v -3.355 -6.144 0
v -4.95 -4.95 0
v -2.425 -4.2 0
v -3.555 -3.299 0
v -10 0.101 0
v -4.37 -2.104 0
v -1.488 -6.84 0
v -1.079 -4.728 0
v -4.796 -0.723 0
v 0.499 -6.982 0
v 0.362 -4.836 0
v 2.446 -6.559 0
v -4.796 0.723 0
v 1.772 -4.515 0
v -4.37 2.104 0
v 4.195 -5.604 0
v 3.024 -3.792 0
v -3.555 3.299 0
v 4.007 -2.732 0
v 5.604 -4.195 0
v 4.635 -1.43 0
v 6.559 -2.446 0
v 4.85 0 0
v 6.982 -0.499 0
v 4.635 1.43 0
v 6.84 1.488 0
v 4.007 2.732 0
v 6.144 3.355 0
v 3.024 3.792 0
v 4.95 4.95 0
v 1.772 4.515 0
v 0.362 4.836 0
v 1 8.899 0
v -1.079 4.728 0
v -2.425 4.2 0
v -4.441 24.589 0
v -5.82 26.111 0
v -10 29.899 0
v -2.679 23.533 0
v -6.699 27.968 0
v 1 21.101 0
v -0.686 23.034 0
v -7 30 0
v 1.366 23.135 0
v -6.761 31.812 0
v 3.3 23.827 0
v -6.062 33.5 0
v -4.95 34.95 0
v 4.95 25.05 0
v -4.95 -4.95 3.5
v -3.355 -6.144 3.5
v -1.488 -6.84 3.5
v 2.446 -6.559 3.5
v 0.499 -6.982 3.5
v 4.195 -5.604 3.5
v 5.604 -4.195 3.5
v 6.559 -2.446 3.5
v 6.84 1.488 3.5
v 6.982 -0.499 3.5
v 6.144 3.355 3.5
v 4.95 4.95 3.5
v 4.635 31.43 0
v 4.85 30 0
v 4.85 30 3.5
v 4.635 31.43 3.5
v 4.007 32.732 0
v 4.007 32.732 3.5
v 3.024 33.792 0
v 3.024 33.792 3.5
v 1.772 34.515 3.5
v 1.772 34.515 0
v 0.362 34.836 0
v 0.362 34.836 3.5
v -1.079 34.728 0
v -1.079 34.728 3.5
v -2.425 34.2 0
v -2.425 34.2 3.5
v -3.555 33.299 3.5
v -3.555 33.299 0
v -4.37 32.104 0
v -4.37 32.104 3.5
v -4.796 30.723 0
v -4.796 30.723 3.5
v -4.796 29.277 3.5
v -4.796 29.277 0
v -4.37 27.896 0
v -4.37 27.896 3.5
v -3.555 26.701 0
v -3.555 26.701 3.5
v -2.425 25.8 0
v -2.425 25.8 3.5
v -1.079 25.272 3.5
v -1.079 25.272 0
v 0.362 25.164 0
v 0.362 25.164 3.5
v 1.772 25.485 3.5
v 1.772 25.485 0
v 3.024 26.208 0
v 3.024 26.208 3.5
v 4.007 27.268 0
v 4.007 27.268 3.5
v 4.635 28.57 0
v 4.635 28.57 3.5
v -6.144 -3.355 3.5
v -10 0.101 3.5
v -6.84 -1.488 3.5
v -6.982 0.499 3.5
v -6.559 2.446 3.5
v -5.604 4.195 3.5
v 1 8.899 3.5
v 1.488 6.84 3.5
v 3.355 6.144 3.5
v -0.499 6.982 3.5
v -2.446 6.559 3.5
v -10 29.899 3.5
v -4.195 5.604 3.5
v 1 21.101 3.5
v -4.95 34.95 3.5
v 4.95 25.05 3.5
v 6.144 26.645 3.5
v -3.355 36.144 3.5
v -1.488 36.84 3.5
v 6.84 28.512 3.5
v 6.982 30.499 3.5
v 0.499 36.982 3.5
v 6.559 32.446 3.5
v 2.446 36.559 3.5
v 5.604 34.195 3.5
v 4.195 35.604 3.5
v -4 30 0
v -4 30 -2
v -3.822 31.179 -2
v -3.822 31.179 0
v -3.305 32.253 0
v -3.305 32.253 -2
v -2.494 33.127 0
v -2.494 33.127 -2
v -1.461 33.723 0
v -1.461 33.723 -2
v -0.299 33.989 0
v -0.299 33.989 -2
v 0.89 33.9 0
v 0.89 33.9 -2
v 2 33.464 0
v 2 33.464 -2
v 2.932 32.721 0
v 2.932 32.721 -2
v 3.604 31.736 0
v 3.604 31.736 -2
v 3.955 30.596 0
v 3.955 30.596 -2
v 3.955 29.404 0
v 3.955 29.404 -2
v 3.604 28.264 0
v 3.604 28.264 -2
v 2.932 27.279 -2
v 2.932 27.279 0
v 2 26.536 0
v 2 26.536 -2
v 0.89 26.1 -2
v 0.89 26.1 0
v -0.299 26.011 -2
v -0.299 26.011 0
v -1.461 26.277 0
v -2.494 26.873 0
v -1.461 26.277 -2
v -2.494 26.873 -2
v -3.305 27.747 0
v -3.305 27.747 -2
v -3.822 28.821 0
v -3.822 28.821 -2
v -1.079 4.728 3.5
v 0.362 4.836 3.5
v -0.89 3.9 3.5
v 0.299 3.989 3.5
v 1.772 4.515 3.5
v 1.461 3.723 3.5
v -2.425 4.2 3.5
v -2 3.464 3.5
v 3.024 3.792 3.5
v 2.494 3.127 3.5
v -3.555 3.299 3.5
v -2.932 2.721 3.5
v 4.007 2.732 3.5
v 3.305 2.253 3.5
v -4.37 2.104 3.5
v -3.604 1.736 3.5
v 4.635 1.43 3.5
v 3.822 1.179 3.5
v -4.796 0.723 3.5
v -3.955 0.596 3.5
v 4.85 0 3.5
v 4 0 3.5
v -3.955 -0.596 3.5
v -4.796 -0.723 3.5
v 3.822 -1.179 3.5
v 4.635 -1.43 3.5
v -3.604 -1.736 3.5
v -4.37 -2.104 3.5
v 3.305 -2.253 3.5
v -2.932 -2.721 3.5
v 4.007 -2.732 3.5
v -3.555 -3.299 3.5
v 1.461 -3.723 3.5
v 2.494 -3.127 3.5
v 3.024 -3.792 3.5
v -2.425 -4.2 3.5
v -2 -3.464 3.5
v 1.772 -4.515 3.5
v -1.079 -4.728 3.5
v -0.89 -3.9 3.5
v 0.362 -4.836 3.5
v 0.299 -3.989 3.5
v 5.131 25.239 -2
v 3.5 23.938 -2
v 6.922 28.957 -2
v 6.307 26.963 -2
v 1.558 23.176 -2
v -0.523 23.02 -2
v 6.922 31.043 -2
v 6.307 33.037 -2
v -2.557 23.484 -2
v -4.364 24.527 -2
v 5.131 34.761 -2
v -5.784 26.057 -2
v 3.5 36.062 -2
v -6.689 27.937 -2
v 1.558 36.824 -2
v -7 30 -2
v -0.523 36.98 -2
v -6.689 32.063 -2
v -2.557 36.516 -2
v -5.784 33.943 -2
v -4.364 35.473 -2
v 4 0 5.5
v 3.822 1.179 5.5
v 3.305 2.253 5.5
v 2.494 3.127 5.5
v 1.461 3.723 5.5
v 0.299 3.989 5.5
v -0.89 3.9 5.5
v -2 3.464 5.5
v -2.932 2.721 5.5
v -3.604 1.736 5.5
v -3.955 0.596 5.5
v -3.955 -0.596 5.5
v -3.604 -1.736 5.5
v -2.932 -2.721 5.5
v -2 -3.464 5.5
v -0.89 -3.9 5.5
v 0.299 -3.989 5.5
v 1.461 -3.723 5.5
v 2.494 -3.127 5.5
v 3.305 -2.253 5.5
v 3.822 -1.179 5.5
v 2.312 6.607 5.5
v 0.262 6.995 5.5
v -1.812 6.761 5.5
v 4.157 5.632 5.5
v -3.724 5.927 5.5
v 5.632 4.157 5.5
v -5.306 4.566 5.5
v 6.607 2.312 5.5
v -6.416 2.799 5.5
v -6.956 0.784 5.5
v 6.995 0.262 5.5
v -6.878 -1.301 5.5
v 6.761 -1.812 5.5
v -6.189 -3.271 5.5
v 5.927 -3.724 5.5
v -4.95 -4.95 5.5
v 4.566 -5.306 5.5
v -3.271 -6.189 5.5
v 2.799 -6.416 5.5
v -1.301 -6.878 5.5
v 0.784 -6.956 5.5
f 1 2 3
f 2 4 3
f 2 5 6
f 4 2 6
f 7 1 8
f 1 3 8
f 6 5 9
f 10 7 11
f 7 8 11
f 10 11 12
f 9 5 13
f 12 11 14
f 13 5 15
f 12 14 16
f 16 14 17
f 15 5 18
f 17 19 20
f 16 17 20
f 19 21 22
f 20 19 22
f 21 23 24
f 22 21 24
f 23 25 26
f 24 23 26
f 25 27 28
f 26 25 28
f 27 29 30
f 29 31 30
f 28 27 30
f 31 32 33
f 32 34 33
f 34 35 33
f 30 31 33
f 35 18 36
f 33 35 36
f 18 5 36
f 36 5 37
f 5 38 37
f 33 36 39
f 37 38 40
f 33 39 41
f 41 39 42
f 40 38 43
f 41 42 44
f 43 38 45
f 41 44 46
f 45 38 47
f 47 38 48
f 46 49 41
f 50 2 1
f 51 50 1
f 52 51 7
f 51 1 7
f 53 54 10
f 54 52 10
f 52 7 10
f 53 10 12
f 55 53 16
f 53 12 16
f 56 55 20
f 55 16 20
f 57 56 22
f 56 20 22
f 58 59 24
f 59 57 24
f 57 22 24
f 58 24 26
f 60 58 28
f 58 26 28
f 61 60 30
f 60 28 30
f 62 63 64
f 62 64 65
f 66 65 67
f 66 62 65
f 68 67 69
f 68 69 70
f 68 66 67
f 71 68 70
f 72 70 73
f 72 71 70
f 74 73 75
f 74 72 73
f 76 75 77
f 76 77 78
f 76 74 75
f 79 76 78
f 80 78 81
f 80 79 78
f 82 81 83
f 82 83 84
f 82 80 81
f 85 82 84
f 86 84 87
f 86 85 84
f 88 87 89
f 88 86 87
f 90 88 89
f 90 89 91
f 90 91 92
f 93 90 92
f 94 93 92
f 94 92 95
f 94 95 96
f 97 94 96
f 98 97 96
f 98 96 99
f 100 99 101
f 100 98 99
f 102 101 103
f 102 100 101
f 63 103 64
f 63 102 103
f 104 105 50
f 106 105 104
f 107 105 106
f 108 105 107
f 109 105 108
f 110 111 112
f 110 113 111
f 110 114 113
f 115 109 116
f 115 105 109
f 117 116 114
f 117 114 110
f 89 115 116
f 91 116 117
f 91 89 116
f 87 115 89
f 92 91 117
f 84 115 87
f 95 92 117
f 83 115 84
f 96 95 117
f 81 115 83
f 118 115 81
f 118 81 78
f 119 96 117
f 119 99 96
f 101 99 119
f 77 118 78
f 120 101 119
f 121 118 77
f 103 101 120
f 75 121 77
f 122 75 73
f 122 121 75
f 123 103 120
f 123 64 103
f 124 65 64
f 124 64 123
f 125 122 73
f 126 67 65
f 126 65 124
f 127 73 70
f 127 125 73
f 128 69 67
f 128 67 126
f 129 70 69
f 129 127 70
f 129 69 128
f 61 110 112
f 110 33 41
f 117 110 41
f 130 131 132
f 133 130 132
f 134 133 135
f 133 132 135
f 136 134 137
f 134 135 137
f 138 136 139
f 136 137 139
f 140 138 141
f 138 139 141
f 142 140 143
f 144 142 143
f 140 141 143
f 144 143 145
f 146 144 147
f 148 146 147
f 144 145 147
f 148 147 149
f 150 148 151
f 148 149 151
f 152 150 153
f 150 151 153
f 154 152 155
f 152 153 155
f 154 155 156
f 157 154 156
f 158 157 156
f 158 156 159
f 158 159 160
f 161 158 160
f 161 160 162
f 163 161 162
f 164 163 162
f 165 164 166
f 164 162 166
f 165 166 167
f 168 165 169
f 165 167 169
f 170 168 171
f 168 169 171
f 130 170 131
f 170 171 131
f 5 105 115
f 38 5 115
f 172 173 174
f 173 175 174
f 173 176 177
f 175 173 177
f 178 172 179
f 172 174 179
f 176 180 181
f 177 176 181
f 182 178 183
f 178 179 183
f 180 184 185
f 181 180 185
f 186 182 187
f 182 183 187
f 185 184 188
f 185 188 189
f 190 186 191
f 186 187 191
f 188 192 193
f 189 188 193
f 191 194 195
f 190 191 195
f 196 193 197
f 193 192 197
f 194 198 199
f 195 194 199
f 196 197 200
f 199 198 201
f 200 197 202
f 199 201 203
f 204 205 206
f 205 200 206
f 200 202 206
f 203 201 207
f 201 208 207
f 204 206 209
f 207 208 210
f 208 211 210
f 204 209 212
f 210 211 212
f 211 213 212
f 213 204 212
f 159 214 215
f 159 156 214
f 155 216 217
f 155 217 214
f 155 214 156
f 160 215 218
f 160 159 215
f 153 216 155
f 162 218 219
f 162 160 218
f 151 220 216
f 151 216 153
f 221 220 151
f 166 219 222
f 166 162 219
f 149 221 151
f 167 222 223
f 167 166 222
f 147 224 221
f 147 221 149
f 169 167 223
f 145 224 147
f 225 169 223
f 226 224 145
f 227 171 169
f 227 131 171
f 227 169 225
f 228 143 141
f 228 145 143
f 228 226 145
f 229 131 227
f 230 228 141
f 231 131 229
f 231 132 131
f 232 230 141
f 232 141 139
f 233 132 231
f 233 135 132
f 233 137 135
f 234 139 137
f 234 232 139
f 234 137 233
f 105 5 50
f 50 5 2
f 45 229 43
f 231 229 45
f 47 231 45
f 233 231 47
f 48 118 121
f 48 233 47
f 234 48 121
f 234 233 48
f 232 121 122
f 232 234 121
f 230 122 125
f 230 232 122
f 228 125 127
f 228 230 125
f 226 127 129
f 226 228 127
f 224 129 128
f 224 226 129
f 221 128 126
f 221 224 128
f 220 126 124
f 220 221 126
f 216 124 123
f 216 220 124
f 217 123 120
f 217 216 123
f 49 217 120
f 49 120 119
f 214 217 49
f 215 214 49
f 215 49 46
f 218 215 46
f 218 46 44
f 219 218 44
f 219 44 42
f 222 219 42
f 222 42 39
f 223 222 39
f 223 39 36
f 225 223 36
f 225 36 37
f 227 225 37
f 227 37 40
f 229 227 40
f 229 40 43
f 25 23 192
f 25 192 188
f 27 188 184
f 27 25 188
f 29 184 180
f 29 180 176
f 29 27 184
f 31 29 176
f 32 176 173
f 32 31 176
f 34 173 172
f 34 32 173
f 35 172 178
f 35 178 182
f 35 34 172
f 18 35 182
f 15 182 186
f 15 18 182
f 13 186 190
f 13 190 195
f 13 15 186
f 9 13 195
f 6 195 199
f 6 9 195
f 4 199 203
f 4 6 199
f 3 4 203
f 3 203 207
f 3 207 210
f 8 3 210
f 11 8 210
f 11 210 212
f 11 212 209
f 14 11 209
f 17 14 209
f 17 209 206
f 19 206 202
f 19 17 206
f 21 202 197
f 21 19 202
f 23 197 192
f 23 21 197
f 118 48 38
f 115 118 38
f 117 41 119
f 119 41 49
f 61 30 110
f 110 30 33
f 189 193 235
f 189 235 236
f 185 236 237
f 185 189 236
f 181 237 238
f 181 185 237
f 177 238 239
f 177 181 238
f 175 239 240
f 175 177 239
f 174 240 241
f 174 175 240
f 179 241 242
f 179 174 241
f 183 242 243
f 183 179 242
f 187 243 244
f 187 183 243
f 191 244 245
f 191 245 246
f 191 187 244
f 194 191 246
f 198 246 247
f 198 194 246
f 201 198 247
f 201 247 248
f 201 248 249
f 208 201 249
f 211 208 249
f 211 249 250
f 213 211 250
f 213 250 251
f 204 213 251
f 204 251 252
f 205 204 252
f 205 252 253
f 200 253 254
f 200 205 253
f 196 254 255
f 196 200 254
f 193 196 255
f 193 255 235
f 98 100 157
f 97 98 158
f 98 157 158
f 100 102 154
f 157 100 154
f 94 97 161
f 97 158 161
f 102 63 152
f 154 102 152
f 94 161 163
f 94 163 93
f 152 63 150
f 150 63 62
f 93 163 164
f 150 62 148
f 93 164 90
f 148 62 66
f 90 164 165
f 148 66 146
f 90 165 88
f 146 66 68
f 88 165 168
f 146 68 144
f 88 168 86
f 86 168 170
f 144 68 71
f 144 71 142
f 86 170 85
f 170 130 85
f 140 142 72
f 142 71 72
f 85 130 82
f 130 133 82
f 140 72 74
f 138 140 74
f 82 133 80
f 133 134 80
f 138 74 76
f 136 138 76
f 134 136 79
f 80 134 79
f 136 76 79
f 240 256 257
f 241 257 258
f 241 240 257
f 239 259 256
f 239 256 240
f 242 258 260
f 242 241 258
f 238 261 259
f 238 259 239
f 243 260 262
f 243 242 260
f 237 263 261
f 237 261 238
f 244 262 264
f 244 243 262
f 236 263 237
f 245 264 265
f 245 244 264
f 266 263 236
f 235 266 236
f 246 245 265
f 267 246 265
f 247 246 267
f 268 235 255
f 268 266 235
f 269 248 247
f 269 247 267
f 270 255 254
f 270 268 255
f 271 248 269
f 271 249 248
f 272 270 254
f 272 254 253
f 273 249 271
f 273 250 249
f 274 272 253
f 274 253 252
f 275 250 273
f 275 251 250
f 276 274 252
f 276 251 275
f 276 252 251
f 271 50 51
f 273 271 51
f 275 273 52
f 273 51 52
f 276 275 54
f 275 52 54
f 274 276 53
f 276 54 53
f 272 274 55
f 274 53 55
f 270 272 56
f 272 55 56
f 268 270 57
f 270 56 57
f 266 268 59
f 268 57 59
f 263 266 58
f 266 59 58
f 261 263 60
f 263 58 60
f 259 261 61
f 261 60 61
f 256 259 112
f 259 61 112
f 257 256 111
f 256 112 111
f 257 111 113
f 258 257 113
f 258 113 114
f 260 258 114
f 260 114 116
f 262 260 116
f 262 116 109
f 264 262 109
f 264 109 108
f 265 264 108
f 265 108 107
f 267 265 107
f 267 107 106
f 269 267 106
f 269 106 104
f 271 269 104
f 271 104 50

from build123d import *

# Parameters (mm, degrees)
CROQUIS1_R              = 7
CROQUIS1_R_2            = 4.85
SALIENTE_EXTRUIR1_DEPTH = 3.5
CROQUIS4_W              = 8.235883517
CROQUIS4_H              = 32.578937154
CORTAR_EXTRUIR4_DEPTH   = 4
CROQUIS5_R              = 7
CROQUIS5_R_2            = 4
SALIENTE_EXTRUIR2_DEPTH = 2
SALIENTE_EXTRUIR3_START = 2
CROQUIS6_R              = 7
CROQUIS6_R_2            = 4
SALIENTE_EXTRUIR3_DEPTH = 2


with BuildPart() as part:
    # Croquis1 → Saliente-Extruir1 (new body)
    # profile 1 of 3: a face of its own
    with BuildSketch(Plane.XY):
        with BuildLine():
            ThreePointArc((-4.949747468, -4.949747468), (-4.949747468, 4.949747468), (4.949747468, 4.949747468))
            Line((4.949747468, 4.949747468), (1, 8.899494937))
            Line((1, 8.899494937), (1, 21.100505063))
            Line((1, 21.100505063), (4.949747468, 25.050252532))
            ThreePointArc((4.949747468, 25.050252532), (-4.949747468, 25.050252532), (-4.949747468, 34.949747468))
            Line((-4.949747468, 34.949747468), (-13, 26.899494937))
            Line((-13, 26.899494937), (-13, 3.100505063))
            Line((-13, 3.100505063), (-4.949747468, -4.949747468))
        make_face()
    # profile 2 of 3: a face of its own
    with BuildSketch(Plane.XY):
        with Locations((0, 30)):
            Circle(CROQUIS1_R)
        with Locations((0, 30)):
            Circle(CROQUIS1_R_2, mode=Mode.SUBTRACT)
    # profile 3 of 3: a face of its own
    with BuildSketch(Plane.XY):
        Circle(CROQUIS1_R)
        Circle(CROQUIS1_R_2, mode=Mode.SUBTRACT)
    extrude(amount=SALIENTE_EXTRUIR1_DEPTH)

    # Croquis4 → Cortar-Extruir4 (cut)
    with BuildSketch(Plane.XY.offset(3.5)):
        with Locations((-14.117941759, 13.61002636)):
            Rectangle(CROQUIS4_W, CROQUIS4_H)
    extrude(amount=-CORTAR_EXTRUIR4_DEPTH, mode=Mode.SUBTRACT)

    # Croquis5 → Saliente-Extruir2 (add)
    with BuildSketch(Plane.XY.offset(3.5)):
        with Locations(Location((0, 0, 0), (0, 0, 225))):
            Circle(CROQUIS5_R)
        Circle(CROQUIS5_R_2, mode=Mode.SUBTRACT)
    extrude(amount=SALIENTE_EXTRUIR2_DEPTH)

    # Croquis6 → Saliente-Extruir3 (add)
    with BuildSketch(Plane(origin=(0, 0, 0), x_dir=(-1, 0, 0), z_dir=(0, 0, -1)).offset(SALIENTE_EXTRUIR3_START)):
        with Locations((0, 30)):
            Circle(CROQUIS6_R)
        with Locations((0, 30)):
            Circle(CROQUIS6_R_2, mode=Mode.SUBTRACT)
    extrude(amount=-SALIENTE_EXTRUIR3_DEPTH)


solid = part.part
